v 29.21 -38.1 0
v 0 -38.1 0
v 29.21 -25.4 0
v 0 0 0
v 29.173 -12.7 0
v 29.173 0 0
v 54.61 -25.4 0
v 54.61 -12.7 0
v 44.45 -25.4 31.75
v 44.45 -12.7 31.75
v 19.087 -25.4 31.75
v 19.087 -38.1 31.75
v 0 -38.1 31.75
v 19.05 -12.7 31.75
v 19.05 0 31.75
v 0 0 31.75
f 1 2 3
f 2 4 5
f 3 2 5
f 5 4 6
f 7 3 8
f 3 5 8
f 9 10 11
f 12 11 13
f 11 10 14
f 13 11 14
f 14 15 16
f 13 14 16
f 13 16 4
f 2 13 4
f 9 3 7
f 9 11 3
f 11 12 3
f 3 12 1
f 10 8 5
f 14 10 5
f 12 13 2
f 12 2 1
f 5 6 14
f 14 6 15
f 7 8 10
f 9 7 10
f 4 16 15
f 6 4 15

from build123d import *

# Parameters (mm, degrees)
F1_DEPTH = 38.1
F3_DEPTH = 12.7
F4_DEPTH = 12.7
F6_DEPTH = 12.7


with BuildPart() as f1:
    # F0 (on Front) → F1 (new body)
    with BuildSketch(Plane.XZ):
        Polygon((0, 31.75), (0, 0), (54.61, 0), (44.45, 31.75), align=None)
    extrude(amount=F1_DEPTH)

    # F2 (on face) → F3 (cut)
    with BuildSketch(Plane(origin=(0, 0, 0), x_dir=(-1, 0, 0), z_dir=(0, 1, 0))):
        Polygon((44.420516, 31.673804), (19.705663, 31.673804), (28.255075, -0.054016), (54.679817, -0.054016), align=None)
        Polygon((-44.45, 31.75), (-54.61, 0), (-29.17323, 0), (-19.05, 31.75), align=None)
    extrude(amount=-F3_DEPTH, mode=Mode.SUBTRACT)

    # F2 (on face) → F4 (cut)
    with BuildSketch(Plane(origin=(0, 0, 0), x_dir=(-1, 0, 0), z_dir=(0, 1, 0))):
        Polygon((44.420516, 31.673804), (19.705663, 31.673804), (28.255075, -0.054016), (54.679817, -0.054016), align=None)
        Polygon((-44.45, 31.75), (-54.61, 0), (-29.17323, 0), (-19.05, 31.75), align=None)
    extrude(amount=-F4_DEPTH, mode=Mode.SUBTRACT)

    # F5 (on face) → F6 (cut)
    with BuildSketch(Plane.XZ.offset(38.1)):
        Polygon((29.21, 0), (54.61, 0), (44.45, 31.75), (19.08677, 31.75), align=None)
    extrude(amount=-F6_DEPTH, mode=Mode.SUBTRACT)


solid = f1.part
